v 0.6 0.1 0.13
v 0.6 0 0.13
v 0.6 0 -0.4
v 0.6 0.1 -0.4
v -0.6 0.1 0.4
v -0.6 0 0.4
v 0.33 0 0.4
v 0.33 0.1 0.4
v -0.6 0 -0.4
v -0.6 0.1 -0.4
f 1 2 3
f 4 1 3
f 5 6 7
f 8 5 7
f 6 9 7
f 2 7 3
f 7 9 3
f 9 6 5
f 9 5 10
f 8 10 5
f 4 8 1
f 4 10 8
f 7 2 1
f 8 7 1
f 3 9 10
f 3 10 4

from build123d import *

# Parameters (mm, degrees)
ESBO_O1_W       = 1.2
ESBO_O1_H       = 0.8
EXTRUS_O1_DEPTH = 0.1
CHANFRO1_SIZE   = 0.27


with BuildPart() as part:
    # Esboço1 → Extrusão1 (new body)
    with BuildSketch(Plane(origin=(0, 0, 0), x_dir=(1, 0, 0), z_dir=(0, 1, 0))):
        Rectangle(ESBO_O1_W, ESBO_O1_H)
    extrude(amount=EXTRUS_O1_DEPTH)

    # Chanfro1
    chanfro1_edges = [part.edges().sort_by_distance(p)[0] for p in [
        (0.6, 0.05, 0.4),
    ]]
    chamfer(chanfro1_edges, length=CHANFRO1_SIZE)


solid = part.part
